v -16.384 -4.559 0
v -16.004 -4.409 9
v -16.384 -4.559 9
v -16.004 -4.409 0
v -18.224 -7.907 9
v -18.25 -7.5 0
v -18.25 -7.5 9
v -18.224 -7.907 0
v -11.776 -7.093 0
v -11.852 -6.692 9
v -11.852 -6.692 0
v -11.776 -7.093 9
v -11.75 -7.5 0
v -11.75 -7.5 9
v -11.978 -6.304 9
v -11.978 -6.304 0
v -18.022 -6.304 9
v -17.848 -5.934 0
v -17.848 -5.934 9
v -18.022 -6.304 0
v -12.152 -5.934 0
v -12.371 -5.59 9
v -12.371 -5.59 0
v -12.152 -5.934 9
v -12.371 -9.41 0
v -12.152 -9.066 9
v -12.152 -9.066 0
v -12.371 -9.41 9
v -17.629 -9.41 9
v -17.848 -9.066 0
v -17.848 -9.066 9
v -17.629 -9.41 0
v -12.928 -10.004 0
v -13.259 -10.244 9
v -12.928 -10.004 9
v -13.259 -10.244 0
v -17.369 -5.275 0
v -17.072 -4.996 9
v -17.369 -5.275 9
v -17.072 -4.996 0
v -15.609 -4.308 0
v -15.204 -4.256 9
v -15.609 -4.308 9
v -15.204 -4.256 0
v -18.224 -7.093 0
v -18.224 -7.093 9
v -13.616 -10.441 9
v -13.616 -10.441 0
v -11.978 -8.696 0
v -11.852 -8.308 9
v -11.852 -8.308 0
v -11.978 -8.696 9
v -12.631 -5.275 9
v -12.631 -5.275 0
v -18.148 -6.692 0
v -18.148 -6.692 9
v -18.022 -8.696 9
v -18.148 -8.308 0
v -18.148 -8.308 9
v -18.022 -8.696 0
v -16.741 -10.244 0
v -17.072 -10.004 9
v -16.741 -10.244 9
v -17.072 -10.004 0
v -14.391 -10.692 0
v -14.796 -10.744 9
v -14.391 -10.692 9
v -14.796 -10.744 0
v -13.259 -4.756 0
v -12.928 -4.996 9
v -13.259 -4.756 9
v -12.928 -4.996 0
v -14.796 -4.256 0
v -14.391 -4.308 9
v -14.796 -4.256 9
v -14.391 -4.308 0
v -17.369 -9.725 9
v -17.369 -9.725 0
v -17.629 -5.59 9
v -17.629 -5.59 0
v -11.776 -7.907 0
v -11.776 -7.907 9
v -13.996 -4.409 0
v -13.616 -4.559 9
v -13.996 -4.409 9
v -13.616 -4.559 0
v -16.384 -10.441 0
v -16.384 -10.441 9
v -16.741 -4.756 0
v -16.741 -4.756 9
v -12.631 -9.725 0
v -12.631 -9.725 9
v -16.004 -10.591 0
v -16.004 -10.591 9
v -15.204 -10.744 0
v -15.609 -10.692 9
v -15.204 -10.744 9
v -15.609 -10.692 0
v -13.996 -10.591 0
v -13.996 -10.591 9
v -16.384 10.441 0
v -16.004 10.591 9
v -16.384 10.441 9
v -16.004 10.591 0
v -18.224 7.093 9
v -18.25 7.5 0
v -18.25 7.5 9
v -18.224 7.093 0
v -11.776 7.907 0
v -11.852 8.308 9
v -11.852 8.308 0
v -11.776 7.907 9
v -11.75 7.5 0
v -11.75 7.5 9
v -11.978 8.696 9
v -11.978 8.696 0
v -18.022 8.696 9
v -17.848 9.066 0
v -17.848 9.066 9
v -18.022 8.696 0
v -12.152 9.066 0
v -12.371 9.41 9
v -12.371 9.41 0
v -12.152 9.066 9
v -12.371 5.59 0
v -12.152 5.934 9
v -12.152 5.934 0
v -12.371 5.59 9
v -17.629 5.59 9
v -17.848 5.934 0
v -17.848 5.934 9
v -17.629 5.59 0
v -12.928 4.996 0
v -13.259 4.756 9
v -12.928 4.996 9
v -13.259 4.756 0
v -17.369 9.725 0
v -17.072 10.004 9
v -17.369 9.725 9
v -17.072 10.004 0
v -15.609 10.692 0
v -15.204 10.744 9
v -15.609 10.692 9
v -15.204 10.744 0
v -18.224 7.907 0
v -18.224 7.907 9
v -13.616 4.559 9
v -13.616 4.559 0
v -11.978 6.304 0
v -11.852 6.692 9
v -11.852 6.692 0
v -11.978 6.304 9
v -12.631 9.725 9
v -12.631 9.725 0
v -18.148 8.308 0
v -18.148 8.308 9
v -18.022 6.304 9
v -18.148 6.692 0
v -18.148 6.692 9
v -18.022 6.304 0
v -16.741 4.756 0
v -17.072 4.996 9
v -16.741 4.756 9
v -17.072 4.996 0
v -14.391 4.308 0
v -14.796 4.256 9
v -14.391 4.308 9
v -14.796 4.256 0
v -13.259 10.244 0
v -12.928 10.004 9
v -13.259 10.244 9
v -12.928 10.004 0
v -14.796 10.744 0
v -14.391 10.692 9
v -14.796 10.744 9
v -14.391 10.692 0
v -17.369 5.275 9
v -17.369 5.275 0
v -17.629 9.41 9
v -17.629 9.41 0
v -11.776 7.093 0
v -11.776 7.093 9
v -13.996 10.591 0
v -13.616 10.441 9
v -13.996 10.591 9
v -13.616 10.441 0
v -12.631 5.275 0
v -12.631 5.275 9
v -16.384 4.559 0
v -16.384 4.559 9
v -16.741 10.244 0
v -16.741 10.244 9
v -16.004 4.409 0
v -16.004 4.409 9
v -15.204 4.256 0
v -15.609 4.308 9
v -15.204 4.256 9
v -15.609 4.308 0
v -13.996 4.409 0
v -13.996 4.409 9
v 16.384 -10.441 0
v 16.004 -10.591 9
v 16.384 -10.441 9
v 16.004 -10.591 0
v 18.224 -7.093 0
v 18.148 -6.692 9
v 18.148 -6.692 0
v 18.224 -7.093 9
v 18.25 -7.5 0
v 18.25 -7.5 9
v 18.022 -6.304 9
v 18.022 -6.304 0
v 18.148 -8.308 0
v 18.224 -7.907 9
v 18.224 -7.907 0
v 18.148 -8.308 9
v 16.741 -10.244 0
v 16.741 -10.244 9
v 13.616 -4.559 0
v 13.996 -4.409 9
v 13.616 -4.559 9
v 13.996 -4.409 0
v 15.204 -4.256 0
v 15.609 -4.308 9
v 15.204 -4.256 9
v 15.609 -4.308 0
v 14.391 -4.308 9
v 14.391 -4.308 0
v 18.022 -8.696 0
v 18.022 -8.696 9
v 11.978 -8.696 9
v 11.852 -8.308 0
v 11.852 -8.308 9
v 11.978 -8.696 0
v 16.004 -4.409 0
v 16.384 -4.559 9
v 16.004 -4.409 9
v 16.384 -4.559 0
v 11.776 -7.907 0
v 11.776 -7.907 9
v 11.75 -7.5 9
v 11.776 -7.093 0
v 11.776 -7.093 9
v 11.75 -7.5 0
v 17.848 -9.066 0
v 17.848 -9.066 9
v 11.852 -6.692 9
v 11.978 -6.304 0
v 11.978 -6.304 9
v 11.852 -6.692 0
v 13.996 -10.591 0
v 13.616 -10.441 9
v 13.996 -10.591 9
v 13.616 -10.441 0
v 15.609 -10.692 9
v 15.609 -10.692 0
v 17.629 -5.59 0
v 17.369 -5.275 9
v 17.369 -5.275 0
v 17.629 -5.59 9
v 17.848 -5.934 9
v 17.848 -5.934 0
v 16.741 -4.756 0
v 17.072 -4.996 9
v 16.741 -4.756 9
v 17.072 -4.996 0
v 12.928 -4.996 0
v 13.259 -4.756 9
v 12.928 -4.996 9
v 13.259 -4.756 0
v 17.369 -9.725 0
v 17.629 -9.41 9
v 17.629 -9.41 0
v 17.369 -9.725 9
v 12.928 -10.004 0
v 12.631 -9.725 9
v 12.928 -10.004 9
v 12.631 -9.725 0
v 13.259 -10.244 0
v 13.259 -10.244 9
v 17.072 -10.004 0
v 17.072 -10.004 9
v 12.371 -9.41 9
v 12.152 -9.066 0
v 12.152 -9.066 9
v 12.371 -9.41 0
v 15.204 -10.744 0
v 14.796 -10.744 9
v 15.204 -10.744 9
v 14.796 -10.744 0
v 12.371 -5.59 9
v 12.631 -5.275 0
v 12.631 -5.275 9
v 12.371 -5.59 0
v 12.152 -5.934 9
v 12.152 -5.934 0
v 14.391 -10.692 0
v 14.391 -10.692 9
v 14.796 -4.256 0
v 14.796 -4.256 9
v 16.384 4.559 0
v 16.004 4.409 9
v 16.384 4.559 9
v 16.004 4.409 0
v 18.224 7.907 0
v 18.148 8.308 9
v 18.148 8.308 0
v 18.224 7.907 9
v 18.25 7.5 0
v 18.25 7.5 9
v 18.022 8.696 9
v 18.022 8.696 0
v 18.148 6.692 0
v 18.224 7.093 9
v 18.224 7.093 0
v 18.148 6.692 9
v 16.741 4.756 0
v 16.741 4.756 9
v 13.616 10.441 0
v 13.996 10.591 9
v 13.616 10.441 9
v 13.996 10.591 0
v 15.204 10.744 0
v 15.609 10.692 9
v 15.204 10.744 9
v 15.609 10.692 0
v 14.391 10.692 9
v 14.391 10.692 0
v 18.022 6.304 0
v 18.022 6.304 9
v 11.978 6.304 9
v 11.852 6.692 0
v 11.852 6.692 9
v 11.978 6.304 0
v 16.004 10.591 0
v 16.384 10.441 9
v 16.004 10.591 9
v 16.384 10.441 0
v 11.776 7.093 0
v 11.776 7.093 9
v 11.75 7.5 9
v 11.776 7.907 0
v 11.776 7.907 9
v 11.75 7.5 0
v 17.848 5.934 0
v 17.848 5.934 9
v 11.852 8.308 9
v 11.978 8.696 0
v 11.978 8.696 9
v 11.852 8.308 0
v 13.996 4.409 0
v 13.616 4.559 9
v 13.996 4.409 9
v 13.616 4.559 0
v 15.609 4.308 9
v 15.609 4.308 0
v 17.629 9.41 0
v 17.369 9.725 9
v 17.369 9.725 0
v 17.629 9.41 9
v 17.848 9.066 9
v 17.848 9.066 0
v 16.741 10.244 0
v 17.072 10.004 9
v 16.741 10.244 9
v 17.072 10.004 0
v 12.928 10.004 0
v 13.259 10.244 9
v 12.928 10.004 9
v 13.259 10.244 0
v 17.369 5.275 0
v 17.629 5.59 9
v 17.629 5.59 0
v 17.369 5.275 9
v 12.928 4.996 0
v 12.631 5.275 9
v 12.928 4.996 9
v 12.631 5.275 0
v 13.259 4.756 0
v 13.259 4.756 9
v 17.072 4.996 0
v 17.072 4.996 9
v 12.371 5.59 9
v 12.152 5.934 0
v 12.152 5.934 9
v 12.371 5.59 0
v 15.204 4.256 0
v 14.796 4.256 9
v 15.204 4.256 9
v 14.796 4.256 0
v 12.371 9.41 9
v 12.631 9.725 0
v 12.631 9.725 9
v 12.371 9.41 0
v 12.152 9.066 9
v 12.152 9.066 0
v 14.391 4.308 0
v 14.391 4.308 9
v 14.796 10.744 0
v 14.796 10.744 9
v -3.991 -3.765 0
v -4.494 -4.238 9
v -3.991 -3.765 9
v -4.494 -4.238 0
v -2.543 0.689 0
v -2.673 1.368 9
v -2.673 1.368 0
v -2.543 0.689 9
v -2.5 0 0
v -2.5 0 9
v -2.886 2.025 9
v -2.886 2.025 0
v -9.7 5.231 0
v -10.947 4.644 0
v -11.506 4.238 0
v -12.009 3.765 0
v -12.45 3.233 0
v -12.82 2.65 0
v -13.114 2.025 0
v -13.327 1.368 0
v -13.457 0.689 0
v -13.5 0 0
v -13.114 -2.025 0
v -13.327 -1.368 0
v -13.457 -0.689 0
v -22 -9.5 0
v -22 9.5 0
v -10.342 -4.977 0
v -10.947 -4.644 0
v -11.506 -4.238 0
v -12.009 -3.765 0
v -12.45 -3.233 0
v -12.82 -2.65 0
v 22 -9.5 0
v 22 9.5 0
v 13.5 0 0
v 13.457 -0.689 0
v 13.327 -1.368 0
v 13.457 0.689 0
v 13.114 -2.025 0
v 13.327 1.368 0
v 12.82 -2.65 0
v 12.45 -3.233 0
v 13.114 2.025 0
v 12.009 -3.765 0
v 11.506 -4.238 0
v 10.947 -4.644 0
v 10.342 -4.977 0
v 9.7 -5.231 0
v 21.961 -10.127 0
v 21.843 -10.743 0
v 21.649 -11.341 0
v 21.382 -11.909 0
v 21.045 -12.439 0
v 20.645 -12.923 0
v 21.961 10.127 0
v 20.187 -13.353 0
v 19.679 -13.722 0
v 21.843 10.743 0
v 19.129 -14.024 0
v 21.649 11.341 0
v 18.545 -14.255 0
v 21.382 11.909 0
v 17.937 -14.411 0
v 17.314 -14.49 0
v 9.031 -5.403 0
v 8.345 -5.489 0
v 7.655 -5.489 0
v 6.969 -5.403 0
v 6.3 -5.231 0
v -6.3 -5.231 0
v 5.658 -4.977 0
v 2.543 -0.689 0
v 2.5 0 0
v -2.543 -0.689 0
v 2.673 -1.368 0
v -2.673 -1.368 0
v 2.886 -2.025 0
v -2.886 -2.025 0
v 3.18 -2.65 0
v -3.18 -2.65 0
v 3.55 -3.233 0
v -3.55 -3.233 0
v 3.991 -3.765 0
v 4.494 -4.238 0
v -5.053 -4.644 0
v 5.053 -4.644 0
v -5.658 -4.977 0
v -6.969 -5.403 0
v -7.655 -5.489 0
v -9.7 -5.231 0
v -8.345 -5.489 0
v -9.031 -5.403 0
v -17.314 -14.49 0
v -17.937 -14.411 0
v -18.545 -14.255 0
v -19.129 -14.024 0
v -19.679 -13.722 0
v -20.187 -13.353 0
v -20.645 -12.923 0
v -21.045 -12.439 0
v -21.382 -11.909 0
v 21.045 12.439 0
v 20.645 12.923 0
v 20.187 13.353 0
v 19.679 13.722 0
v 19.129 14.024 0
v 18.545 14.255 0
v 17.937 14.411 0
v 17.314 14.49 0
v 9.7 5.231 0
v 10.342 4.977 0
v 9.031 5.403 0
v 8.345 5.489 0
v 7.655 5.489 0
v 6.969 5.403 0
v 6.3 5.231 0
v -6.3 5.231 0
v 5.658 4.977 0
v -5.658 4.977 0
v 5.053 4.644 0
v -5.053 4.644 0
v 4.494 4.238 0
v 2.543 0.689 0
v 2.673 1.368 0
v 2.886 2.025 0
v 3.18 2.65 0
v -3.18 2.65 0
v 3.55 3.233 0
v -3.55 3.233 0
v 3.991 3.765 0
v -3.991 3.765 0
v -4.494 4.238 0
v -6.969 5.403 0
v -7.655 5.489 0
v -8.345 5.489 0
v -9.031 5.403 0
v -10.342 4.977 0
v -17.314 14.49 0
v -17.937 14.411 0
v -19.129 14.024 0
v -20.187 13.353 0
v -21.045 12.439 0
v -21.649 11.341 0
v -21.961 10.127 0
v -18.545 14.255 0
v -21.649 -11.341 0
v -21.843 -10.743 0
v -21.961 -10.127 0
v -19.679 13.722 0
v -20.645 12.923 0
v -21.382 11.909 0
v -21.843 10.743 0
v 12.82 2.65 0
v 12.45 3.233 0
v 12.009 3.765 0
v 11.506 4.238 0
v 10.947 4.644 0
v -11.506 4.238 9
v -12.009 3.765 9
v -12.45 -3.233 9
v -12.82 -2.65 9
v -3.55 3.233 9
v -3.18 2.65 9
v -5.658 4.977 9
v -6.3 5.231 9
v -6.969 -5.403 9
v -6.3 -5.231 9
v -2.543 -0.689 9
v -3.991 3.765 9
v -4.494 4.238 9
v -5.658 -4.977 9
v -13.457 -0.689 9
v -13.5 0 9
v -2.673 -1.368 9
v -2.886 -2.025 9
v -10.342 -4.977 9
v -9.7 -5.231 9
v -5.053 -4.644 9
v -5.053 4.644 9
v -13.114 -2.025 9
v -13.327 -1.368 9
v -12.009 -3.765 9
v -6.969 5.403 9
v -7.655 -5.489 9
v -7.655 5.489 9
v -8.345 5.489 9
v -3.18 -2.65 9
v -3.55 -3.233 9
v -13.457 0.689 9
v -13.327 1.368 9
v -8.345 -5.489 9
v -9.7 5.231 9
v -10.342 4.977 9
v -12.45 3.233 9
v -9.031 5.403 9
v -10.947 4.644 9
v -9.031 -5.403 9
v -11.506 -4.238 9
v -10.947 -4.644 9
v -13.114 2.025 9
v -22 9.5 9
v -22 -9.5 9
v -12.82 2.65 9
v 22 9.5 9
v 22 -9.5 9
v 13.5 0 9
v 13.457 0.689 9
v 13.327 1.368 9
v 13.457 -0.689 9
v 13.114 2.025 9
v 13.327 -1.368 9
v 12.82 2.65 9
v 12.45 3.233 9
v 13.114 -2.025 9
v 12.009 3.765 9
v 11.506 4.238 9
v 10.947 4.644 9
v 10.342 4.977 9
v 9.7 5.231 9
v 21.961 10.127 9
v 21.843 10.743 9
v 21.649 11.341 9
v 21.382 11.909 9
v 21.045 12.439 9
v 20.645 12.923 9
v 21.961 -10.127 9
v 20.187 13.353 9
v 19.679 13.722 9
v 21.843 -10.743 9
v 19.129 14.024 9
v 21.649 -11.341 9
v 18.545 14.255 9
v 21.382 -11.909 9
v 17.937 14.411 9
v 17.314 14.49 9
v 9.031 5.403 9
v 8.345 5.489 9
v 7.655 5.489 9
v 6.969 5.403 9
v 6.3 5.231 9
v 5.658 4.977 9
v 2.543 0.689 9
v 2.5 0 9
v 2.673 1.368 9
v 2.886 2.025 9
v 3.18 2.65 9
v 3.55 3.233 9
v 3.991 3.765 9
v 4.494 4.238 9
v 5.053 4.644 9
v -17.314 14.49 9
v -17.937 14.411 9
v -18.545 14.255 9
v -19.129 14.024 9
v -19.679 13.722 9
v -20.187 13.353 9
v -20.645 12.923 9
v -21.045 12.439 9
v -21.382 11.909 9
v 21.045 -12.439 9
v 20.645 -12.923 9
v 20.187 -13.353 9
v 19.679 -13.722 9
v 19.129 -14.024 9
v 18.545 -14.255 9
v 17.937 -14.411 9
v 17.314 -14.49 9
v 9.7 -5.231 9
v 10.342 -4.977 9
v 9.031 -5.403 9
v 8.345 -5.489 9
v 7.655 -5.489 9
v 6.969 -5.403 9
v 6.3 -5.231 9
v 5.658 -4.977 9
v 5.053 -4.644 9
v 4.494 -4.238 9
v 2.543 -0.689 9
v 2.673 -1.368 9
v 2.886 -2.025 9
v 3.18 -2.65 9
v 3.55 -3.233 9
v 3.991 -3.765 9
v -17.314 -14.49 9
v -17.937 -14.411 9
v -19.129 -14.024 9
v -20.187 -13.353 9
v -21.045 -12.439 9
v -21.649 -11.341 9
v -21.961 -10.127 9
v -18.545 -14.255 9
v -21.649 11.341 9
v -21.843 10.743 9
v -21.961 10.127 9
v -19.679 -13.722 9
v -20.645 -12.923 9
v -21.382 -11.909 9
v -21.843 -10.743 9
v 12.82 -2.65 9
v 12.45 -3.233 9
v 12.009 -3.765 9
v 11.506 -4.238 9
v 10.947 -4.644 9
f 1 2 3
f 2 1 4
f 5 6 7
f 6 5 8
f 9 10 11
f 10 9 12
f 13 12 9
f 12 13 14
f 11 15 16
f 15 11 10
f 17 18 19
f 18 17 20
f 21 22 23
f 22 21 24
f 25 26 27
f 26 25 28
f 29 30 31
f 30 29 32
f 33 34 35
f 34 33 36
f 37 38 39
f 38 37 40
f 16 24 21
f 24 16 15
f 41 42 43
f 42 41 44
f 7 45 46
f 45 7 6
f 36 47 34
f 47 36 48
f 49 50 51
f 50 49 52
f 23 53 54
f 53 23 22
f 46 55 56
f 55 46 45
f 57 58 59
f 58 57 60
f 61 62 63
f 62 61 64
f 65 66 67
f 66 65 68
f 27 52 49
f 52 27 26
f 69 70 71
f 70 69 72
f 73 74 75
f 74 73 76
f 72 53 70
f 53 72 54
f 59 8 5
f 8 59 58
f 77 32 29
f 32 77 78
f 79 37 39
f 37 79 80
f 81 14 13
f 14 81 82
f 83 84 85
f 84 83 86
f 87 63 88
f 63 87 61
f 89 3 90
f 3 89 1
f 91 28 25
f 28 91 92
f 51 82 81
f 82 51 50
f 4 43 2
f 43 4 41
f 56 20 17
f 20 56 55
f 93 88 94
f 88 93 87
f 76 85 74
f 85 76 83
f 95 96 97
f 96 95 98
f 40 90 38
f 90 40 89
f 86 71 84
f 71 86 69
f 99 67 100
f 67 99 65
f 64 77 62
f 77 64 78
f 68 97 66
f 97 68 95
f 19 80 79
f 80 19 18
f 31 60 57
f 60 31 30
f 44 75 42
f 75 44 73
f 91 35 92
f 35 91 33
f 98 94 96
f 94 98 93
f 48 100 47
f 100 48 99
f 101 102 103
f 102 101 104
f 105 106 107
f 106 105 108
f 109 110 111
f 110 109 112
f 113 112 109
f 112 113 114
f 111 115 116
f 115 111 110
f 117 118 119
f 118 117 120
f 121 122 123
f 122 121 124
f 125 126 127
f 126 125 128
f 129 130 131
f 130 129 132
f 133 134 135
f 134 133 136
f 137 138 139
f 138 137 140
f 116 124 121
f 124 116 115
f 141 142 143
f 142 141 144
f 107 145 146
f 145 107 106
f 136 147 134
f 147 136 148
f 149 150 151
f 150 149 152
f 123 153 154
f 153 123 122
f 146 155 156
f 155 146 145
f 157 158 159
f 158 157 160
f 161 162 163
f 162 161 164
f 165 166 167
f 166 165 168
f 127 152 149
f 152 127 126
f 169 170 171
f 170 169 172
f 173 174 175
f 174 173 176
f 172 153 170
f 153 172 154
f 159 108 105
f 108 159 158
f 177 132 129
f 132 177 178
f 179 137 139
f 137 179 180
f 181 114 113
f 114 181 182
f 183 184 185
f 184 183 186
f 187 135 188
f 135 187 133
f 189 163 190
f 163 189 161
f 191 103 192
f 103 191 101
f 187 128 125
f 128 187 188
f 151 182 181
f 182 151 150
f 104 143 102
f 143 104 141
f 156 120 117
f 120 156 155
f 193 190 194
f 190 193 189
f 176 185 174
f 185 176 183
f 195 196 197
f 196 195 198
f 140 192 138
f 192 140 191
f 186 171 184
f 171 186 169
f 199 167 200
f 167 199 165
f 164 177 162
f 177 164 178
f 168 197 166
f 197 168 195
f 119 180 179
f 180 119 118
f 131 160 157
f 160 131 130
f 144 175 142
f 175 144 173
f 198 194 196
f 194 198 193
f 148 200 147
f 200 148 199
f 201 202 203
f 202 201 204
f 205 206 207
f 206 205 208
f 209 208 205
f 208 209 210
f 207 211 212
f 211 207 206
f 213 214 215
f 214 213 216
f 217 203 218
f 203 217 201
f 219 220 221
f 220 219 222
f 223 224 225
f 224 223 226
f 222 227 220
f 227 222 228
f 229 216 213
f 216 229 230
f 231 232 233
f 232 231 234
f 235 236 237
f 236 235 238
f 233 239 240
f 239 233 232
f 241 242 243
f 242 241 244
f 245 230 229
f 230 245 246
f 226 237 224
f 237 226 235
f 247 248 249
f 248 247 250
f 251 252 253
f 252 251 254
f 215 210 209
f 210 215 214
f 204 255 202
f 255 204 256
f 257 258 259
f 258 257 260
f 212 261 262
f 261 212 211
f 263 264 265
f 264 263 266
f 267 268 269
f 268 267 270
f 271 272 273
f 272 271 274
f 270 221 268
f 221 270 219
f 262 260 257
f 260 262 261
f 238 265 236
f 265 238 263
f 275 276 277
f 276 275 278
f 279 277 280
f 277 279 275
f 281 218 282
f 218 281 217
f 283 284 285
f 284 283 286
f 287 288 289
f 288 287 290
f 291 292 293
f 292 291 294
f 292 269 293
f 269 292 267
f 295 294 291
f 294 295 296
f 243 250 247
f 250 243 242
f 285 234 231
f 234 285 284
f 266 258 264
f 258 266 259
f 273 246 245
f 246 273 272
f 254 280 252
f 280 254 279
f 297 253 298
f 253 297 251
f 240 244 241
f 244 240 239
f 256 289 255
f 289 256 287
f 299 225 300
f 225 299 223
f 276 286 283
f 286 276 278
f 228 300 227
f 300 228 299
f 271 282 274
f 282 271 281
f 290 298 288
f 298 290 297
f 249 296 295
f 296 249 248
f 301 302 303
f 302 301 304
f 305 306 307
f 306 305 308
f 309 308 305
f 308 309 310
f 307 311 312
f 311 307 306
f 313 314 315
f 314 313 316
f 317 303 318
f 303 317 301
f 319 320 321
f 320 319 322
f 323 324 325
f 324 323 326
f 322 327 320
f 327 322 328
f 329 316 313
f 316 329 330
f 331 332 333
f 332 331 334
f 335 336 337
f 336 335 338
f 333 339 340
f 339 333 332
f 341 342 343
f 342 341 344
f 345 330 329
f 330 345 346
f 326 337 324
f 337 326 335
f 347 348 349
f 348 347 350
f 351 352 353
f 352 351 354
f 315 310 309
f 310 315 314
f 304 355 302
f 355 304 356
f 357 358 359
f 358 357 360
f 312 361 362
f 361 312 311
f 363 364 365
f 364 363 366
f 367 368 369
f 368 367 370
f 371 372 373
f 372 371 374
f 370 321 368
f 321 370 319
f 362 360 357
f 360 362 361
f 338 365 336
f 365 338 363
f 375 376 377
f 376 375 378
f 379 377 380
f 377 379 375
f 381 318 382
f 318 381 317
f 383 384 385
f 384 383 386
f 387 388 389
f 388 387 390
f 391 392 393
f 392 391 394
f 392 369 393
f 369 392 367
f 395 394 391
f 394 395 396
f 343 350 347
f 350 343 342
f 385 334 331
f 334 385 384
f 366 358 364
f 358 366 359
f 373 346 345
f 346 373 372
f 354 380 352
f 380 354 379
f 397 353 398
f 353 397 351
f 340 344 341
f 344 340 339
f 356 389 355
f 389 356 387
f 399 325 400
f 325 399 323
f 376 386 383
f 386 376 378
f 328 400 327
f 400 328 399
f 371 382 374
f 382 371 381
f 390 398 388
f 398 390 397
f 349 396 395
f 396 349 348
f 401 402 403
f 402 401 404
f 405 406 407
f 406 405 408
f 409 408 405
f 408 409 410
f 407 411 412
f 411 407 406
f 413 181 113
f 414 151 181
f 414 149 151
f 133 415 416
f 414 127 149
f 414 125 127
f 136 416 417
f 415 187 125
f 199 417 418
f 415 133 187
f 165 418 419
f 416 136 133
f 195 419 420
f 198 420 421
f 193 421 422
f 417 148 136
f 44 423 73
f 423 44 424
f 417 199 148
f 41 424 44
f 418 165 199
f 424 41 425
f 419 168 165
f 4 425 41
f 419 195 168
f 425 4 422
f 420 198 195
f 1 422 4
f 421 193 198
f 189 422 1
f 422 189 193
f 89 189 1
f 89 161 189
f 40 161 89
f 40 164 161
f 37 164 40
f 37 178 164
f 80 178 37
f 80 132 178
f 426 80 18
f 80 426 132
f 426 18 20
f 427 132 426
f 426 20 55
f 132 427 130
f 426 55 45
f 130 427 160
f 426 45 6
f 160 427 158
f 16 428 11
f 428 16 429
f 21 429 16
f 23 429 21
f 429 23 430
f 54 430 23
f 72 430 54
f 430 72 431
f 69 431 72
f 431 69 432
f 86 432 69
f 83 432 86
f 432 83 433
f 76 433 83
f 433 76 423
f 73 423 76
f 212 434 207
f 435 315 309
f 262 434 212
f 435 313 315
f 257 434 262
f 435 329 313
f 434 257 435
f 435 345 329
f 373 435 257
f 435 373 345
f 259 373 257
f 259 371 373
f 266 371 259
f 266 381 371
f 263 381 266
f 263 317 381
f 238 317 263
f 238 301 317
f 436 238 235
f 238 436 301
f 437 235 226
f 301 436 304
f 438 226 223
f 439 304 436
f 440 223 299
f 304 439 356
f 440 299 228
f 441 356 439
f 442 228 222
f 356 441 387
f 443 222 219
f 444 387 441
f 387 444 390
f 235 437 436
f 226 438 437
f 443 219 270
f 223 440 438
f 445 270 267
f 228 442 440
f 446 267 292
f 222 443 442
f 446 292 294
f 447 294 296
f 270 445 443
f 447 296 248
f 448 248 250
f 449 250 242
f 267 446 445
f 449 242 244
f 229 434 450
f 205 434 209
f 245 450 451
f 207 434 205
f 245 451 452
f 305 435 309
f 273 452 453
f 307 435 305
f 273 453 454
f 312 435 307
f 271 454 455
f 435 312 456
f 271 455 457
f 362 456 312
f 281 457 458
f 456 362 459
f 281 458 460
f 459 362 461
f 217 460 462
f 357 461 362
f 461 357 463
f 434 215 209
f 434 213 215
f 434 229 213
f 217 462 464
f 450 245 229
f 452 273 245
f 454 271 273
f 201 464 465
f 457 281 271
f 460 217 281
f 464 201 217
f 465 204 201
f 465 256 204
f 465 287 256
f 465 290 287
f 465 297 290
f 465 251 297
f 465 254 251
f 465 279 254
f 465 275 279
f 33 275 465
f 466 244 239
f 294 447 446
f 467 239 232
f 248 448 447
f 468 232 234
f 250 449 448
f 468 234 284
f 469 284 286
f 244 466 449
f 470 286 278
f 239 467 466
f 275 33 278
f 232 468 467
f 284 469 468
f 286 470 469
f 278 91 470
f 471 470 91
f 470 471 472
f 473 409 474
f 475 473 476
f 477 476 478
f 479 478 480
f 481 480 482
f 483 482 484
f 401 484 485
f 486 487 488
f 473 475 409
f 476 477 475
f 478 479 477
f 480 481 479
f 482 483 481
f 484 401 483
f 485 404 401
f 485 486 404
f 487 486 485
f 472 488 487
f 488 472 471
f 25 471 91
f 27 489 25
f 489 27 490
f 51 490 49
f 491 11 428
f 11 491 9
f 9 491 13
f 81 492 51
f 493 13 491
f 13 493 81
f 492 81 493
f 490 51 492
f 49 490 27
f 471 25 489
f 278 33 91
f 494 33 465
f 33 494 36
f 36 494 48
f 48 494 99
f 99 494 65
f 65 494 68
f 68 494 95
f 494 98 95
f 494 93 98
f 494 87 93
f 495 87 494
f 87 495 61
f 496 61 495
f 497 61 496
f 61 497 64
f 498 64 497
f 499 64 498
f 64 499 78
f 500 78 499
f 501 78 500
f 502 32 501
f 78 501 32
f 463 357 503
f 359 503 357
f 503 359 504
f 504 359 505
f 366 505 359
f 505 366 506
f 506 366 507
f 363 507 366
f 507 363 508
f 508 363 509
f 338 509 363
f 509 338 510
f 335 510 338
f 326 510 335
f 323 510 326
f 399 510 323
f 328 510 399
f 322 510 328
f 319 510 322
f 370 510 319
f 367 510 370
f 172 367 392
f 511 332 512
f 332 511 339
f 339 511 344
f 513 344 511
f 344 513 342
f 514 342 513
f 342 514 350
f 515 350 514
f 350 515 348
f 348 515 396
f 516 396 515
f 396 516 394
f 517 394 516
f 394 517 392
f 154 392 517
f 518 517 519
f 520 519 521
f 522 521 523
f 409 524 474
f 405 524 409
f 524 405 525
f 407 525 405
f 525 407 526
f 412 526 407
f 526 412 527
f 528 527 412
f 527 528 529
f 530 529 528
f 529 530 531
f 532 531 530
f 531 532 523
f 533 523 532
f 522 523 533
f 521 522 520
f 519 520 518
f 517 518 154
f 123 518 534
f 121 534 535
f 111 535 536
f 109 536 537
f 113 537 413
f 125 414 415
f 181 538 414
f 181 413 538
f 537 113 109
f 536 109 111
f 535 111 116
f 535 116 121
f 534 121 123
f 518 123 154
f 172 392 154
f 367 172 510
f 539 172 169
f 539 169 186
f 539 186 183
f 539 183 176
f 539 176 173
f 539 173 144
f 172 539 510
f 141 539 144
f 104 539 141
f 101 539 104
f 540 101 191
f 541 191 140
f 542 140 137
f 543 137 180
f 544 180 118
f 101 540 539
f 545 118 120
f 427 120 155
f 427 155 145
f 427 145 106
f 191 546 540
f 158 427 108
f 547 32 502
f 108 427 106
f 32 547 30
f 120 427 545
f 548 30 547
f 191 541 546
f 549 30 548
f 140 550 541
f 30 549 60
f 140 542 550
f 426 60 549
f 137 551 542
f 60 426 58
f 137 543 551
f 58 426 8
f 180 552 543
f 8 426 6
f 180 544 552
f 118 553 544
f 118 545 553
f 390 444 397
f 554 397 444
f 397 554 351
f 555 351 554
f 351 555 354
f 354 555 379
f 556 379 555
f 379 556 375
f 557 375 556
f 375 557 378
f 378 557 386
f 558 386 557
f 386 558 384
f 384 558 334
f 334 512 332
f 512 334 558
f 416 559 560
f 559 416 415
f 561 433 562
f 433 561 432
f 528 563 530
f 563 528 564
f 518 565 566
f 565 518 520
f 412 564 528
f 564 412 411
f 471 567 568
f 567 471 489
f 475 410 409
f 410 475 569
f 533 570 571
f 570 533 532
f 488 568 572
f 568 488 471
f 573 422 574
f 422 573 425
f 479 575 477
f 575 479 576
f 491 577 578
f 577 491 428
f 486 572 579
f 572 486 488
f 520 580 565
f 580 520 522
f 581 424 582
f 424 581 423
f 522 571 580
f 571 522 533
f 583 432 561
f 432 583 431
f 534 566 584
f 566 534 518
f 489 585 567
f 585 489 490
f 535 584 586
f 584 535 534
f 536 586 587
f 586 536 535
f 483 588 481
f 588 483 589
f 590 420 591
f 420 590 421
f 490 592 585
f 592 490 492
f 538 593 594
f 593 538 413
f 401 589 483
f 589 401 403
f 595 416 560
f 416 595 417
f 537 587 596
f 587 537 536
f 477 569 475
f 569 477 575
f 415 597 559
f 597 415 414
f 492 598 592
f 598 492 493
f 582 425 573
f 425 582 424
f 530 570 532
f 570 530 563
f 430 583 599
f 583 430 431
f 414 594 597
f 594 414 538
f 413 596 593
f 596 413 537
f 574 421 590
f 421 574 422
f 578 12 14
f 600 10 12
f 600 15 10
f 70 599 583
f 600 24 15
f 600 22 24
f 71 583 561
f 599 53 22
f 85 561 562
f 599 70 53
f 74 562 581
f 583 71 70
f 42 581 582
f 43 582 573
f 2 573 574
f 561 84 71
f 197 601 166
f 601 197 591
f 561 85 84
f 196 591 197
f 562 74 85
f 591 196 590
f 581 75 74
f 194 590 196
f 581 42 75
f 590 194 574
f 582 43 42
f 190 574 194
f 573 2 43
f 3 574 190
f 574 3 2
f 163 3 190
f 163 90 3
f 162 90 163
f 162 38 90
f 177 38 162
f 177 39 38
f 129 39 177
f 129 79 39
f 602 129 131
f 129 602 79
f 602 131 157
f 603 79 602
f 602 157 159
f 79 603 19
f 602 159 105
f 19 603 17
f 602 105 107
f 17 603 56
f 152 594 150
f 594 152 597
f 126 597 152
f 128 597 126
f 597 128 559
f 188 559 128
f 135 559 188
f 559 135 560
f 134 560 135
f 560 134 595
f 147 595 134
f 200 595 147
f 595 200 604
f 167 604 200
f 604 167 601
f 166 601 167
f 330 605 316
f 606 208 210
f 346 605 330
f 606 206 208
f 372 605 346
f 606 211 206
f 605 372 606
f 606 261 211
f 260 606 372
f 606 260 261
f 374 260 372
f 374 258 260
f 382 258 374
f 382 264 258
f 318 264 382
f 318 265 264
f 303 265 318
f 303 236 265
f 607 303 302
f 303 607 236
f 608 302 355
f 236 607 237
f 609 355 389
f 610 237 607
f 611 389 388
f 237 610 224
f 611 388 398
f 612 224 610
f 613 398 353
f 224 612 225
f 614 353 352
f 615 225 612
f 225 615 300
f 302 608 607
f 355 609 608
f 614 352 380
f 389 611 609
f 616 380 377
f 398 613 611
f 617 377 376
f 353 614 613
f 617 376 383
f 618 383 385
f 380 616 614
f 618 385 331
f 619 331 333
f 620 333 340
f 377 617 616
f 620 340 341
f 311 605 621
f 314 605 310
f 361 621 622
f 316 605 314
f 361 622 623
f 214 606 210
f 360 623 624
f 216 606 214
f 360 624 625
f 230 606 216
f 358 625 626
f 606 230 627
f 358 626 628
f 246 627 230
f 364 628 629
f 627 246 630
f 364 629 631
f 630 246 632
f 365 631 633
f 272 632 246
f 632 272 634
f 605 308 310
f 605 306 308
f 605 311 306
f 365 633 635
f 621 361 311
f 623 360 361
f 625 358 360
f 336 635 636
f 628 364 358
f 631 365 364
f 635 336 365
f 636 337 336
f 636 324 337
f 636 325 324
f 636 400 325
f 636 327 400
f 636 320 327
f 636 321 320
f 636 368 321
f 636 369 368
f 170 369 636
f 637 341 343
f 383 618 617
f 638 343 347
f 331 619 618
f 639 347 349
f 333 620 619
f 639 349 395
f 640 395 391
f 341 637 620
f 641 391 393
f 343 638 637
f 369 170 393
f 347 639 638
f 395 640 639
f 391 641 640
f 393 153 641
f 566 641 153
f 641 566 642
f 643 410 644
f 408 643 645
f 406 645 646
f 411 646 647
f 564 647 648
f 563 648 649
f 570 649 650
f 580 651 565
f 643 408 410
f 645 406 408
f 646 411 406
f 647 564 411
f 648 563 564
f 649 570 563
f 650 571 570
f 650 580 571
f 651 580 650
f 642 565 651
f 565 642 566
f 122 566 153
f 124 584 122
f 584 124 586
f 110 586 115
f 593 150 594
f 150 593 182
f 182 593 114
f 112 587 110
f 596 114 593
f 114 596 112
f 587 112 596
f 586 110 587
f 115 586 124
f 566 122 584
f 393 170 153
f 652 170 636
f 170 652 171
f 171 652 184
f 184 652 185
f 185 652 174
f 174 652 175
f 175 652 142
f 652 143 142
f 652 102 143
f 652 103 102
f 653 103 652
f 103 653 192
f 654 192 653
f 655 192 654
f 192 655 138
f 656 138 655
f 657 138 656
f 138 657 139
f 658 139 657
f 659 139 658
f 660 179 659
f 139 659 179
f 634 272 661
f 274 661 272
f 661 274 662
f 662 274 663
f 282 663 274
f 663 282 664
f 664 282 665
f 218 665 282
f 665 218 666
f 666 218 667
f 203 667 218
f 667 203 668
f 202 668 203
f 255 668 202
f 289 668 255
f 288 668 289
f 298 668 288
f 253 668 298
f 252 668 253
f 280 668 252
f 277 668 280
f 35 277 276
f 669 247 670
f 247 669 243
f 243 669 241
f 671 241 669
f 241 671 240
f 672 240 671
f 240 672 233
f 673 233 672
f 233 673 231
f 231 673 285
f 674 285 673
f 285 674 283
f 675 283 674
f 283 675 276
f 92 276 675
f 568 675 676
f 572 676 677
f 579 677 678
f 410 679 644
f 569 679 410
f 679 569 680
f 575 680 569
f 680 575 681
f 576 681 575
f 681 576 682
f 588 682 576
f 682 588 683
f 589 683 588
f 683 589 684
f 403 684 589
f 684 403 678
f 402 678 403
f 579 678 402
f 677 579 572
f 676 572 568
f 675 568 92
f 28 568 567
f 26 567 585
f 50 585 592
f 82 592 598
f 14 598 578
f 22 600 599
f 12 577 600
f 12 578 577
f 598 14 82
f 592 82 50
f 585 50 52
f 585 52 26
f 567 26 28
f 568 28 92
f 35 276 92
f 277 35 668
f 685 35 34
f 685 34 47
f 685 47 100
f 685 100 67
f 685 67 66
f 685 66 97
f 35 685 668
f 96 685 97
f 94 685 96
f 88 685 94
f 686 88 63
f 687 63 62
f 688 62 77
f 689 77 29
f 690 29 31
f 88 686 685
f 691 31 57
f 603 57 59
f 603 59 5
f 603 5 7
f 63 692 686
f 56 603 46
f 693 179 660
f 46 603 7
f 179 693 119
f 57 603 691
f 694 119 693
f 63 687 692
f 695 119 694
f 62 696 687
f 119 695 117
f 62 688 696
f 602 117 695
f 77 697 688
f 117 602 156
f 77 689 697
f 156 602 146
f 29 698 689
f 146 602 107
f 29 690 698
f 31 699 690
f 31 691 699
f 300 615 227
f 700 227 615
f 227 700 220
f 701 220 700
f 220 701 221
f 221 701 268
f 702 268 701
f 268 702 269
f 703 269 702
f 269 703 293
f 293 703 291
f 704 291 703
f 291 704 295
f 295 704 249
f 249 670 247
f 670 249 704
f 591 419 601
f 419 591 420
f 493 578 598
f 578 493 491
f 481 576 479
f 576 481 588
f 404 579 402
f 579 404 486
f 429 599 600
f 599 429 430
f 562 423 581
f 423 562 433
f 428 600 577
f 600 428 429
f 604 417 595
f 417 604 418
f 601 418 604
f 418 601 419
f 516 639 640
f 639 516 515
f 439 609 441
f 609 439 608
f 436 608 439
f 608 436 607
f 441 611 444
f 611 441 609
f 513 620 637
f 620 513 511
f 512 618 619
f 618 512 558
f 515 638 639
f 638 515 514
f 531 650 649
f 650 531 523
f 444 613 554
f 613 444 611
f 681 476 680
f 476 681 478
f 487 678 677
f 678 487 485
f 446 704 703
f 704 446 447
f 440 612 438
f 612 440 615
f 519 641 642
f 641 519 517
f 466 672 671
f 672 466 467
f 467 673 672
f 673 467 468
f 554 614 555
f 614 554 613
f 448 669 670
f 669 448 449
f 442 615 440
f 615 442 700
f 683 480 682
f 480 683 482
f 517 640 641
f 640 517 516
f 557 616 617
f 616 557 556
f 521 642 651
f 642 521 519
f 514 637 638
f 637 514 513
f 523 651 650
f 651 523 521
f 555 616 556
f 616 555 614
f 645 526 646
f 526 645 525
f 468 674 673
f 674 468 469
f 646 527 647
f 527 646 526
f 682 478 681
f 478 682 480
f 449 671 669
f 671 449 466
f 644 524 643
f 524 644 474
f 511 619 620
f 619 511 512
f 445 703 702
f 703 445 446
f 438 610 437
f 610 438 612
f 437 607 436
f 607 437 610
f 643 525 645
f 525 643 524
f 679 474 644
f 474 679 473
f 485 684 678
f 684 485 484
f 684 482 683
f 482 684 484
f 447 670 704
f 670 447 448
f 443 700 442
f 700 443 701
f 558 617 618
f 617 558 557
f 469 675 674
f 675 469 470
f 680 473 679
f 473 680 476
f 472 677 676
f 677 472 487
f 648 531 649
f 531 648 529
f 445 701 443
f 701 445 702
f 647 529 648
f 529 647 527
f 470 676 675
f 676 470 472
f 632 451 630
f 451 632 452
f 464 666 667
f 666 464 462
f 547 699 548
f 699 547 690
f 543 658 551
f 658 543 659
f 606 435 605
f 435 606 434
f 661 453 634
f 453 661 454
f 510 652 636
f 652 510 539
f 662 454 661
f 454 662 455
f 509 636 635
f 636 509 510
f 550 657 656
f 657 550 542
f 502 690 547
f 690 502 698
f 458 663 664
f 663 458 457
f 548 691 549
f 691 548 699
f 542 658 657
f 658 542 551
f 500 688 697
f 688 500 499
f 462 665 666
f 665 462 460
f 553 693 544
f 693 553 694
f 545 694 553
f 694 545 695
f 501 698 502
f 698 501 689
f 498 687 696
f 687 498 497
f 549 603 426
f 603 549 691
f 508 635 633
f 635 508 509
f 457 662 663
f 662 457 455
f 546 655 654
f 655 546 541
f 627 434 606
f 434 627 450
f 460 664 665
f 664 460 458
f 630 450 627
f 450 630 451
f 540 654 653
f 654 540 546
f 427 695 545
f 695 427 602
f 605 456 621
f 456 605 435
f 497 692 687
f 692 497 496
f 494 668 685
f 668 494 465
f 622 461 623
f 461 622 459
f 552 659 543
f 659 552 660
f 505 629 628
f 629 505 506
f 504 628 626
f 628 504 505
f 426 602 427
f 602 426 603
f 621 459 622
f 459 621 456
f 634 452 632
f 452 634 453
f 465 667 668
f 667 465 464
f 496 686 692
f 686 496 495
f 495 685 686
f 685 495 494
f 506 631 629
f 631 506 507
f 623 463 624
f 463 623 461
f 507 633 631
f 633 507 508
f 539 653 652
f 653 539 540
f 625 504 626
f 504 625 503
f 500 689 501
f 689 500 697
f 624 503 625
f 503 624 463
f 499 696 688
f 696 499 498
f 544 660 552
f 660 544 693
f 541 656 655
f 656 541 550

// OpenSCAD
$fn = 50;

difference() {
	union() {
		hull() {
			translate(v = [-17.0, 9.5, 0]) {
				cylinder(h = 9, r = 5);
			}
			translate(v = [17.0, 9.5, 0]) {
				cylinder(h = 9, r = 5);
			}
			translate(v = [-17.0, -9.5, 0]) {
				cylinder(h = 9, r = 5);
			}
			translate(v = [17.0, -9.5, 0]) {
				cylinder(h = 9, r = 5);
			}
		}
	}
	union() {
		translate(v = [-15.0, -7.5, -100.0]) {
			cylinder(h = 200, r = 3.25);
		}
		translate(v = [-15.0, 7.5, -100.0]) {
			cylinder(h = 200, r = 3.25);
		}
		translate(v = [15.0, -7.5, -100.0]) {
			cylinder(h = 200, r = 3.25);
		}
		translate(v = [15.0, 7.5, -100.0]) {
			cylinder(h = 200, r = 3.25);
		}
		translate(v = [-15.0, -7.5, -100.0]) {
			cylinder(h = 200, r = 1.8);
		}
		translate(v = [-15.0, 7.5, -100.0]) {
			cylinder(h = 200, r = 1.8);
		}
		translate(v = [15.0, -7.5, -100.0]) {
			cylinder(h = 200, r = 1.8);
		}
		translate(v = [15.0, 7.5, -100.0]) {
			cylinder(h = 200, r = 1.8);
		}
		translate(v = [-8.0, 0, 0.0]) {
			cylinder(h = 9, r = 5.5);
		}
		translate(v = [8.0, 0, 0.0]) {
			cylinder(h = 9, r = 5.5);
		}
	}
}
